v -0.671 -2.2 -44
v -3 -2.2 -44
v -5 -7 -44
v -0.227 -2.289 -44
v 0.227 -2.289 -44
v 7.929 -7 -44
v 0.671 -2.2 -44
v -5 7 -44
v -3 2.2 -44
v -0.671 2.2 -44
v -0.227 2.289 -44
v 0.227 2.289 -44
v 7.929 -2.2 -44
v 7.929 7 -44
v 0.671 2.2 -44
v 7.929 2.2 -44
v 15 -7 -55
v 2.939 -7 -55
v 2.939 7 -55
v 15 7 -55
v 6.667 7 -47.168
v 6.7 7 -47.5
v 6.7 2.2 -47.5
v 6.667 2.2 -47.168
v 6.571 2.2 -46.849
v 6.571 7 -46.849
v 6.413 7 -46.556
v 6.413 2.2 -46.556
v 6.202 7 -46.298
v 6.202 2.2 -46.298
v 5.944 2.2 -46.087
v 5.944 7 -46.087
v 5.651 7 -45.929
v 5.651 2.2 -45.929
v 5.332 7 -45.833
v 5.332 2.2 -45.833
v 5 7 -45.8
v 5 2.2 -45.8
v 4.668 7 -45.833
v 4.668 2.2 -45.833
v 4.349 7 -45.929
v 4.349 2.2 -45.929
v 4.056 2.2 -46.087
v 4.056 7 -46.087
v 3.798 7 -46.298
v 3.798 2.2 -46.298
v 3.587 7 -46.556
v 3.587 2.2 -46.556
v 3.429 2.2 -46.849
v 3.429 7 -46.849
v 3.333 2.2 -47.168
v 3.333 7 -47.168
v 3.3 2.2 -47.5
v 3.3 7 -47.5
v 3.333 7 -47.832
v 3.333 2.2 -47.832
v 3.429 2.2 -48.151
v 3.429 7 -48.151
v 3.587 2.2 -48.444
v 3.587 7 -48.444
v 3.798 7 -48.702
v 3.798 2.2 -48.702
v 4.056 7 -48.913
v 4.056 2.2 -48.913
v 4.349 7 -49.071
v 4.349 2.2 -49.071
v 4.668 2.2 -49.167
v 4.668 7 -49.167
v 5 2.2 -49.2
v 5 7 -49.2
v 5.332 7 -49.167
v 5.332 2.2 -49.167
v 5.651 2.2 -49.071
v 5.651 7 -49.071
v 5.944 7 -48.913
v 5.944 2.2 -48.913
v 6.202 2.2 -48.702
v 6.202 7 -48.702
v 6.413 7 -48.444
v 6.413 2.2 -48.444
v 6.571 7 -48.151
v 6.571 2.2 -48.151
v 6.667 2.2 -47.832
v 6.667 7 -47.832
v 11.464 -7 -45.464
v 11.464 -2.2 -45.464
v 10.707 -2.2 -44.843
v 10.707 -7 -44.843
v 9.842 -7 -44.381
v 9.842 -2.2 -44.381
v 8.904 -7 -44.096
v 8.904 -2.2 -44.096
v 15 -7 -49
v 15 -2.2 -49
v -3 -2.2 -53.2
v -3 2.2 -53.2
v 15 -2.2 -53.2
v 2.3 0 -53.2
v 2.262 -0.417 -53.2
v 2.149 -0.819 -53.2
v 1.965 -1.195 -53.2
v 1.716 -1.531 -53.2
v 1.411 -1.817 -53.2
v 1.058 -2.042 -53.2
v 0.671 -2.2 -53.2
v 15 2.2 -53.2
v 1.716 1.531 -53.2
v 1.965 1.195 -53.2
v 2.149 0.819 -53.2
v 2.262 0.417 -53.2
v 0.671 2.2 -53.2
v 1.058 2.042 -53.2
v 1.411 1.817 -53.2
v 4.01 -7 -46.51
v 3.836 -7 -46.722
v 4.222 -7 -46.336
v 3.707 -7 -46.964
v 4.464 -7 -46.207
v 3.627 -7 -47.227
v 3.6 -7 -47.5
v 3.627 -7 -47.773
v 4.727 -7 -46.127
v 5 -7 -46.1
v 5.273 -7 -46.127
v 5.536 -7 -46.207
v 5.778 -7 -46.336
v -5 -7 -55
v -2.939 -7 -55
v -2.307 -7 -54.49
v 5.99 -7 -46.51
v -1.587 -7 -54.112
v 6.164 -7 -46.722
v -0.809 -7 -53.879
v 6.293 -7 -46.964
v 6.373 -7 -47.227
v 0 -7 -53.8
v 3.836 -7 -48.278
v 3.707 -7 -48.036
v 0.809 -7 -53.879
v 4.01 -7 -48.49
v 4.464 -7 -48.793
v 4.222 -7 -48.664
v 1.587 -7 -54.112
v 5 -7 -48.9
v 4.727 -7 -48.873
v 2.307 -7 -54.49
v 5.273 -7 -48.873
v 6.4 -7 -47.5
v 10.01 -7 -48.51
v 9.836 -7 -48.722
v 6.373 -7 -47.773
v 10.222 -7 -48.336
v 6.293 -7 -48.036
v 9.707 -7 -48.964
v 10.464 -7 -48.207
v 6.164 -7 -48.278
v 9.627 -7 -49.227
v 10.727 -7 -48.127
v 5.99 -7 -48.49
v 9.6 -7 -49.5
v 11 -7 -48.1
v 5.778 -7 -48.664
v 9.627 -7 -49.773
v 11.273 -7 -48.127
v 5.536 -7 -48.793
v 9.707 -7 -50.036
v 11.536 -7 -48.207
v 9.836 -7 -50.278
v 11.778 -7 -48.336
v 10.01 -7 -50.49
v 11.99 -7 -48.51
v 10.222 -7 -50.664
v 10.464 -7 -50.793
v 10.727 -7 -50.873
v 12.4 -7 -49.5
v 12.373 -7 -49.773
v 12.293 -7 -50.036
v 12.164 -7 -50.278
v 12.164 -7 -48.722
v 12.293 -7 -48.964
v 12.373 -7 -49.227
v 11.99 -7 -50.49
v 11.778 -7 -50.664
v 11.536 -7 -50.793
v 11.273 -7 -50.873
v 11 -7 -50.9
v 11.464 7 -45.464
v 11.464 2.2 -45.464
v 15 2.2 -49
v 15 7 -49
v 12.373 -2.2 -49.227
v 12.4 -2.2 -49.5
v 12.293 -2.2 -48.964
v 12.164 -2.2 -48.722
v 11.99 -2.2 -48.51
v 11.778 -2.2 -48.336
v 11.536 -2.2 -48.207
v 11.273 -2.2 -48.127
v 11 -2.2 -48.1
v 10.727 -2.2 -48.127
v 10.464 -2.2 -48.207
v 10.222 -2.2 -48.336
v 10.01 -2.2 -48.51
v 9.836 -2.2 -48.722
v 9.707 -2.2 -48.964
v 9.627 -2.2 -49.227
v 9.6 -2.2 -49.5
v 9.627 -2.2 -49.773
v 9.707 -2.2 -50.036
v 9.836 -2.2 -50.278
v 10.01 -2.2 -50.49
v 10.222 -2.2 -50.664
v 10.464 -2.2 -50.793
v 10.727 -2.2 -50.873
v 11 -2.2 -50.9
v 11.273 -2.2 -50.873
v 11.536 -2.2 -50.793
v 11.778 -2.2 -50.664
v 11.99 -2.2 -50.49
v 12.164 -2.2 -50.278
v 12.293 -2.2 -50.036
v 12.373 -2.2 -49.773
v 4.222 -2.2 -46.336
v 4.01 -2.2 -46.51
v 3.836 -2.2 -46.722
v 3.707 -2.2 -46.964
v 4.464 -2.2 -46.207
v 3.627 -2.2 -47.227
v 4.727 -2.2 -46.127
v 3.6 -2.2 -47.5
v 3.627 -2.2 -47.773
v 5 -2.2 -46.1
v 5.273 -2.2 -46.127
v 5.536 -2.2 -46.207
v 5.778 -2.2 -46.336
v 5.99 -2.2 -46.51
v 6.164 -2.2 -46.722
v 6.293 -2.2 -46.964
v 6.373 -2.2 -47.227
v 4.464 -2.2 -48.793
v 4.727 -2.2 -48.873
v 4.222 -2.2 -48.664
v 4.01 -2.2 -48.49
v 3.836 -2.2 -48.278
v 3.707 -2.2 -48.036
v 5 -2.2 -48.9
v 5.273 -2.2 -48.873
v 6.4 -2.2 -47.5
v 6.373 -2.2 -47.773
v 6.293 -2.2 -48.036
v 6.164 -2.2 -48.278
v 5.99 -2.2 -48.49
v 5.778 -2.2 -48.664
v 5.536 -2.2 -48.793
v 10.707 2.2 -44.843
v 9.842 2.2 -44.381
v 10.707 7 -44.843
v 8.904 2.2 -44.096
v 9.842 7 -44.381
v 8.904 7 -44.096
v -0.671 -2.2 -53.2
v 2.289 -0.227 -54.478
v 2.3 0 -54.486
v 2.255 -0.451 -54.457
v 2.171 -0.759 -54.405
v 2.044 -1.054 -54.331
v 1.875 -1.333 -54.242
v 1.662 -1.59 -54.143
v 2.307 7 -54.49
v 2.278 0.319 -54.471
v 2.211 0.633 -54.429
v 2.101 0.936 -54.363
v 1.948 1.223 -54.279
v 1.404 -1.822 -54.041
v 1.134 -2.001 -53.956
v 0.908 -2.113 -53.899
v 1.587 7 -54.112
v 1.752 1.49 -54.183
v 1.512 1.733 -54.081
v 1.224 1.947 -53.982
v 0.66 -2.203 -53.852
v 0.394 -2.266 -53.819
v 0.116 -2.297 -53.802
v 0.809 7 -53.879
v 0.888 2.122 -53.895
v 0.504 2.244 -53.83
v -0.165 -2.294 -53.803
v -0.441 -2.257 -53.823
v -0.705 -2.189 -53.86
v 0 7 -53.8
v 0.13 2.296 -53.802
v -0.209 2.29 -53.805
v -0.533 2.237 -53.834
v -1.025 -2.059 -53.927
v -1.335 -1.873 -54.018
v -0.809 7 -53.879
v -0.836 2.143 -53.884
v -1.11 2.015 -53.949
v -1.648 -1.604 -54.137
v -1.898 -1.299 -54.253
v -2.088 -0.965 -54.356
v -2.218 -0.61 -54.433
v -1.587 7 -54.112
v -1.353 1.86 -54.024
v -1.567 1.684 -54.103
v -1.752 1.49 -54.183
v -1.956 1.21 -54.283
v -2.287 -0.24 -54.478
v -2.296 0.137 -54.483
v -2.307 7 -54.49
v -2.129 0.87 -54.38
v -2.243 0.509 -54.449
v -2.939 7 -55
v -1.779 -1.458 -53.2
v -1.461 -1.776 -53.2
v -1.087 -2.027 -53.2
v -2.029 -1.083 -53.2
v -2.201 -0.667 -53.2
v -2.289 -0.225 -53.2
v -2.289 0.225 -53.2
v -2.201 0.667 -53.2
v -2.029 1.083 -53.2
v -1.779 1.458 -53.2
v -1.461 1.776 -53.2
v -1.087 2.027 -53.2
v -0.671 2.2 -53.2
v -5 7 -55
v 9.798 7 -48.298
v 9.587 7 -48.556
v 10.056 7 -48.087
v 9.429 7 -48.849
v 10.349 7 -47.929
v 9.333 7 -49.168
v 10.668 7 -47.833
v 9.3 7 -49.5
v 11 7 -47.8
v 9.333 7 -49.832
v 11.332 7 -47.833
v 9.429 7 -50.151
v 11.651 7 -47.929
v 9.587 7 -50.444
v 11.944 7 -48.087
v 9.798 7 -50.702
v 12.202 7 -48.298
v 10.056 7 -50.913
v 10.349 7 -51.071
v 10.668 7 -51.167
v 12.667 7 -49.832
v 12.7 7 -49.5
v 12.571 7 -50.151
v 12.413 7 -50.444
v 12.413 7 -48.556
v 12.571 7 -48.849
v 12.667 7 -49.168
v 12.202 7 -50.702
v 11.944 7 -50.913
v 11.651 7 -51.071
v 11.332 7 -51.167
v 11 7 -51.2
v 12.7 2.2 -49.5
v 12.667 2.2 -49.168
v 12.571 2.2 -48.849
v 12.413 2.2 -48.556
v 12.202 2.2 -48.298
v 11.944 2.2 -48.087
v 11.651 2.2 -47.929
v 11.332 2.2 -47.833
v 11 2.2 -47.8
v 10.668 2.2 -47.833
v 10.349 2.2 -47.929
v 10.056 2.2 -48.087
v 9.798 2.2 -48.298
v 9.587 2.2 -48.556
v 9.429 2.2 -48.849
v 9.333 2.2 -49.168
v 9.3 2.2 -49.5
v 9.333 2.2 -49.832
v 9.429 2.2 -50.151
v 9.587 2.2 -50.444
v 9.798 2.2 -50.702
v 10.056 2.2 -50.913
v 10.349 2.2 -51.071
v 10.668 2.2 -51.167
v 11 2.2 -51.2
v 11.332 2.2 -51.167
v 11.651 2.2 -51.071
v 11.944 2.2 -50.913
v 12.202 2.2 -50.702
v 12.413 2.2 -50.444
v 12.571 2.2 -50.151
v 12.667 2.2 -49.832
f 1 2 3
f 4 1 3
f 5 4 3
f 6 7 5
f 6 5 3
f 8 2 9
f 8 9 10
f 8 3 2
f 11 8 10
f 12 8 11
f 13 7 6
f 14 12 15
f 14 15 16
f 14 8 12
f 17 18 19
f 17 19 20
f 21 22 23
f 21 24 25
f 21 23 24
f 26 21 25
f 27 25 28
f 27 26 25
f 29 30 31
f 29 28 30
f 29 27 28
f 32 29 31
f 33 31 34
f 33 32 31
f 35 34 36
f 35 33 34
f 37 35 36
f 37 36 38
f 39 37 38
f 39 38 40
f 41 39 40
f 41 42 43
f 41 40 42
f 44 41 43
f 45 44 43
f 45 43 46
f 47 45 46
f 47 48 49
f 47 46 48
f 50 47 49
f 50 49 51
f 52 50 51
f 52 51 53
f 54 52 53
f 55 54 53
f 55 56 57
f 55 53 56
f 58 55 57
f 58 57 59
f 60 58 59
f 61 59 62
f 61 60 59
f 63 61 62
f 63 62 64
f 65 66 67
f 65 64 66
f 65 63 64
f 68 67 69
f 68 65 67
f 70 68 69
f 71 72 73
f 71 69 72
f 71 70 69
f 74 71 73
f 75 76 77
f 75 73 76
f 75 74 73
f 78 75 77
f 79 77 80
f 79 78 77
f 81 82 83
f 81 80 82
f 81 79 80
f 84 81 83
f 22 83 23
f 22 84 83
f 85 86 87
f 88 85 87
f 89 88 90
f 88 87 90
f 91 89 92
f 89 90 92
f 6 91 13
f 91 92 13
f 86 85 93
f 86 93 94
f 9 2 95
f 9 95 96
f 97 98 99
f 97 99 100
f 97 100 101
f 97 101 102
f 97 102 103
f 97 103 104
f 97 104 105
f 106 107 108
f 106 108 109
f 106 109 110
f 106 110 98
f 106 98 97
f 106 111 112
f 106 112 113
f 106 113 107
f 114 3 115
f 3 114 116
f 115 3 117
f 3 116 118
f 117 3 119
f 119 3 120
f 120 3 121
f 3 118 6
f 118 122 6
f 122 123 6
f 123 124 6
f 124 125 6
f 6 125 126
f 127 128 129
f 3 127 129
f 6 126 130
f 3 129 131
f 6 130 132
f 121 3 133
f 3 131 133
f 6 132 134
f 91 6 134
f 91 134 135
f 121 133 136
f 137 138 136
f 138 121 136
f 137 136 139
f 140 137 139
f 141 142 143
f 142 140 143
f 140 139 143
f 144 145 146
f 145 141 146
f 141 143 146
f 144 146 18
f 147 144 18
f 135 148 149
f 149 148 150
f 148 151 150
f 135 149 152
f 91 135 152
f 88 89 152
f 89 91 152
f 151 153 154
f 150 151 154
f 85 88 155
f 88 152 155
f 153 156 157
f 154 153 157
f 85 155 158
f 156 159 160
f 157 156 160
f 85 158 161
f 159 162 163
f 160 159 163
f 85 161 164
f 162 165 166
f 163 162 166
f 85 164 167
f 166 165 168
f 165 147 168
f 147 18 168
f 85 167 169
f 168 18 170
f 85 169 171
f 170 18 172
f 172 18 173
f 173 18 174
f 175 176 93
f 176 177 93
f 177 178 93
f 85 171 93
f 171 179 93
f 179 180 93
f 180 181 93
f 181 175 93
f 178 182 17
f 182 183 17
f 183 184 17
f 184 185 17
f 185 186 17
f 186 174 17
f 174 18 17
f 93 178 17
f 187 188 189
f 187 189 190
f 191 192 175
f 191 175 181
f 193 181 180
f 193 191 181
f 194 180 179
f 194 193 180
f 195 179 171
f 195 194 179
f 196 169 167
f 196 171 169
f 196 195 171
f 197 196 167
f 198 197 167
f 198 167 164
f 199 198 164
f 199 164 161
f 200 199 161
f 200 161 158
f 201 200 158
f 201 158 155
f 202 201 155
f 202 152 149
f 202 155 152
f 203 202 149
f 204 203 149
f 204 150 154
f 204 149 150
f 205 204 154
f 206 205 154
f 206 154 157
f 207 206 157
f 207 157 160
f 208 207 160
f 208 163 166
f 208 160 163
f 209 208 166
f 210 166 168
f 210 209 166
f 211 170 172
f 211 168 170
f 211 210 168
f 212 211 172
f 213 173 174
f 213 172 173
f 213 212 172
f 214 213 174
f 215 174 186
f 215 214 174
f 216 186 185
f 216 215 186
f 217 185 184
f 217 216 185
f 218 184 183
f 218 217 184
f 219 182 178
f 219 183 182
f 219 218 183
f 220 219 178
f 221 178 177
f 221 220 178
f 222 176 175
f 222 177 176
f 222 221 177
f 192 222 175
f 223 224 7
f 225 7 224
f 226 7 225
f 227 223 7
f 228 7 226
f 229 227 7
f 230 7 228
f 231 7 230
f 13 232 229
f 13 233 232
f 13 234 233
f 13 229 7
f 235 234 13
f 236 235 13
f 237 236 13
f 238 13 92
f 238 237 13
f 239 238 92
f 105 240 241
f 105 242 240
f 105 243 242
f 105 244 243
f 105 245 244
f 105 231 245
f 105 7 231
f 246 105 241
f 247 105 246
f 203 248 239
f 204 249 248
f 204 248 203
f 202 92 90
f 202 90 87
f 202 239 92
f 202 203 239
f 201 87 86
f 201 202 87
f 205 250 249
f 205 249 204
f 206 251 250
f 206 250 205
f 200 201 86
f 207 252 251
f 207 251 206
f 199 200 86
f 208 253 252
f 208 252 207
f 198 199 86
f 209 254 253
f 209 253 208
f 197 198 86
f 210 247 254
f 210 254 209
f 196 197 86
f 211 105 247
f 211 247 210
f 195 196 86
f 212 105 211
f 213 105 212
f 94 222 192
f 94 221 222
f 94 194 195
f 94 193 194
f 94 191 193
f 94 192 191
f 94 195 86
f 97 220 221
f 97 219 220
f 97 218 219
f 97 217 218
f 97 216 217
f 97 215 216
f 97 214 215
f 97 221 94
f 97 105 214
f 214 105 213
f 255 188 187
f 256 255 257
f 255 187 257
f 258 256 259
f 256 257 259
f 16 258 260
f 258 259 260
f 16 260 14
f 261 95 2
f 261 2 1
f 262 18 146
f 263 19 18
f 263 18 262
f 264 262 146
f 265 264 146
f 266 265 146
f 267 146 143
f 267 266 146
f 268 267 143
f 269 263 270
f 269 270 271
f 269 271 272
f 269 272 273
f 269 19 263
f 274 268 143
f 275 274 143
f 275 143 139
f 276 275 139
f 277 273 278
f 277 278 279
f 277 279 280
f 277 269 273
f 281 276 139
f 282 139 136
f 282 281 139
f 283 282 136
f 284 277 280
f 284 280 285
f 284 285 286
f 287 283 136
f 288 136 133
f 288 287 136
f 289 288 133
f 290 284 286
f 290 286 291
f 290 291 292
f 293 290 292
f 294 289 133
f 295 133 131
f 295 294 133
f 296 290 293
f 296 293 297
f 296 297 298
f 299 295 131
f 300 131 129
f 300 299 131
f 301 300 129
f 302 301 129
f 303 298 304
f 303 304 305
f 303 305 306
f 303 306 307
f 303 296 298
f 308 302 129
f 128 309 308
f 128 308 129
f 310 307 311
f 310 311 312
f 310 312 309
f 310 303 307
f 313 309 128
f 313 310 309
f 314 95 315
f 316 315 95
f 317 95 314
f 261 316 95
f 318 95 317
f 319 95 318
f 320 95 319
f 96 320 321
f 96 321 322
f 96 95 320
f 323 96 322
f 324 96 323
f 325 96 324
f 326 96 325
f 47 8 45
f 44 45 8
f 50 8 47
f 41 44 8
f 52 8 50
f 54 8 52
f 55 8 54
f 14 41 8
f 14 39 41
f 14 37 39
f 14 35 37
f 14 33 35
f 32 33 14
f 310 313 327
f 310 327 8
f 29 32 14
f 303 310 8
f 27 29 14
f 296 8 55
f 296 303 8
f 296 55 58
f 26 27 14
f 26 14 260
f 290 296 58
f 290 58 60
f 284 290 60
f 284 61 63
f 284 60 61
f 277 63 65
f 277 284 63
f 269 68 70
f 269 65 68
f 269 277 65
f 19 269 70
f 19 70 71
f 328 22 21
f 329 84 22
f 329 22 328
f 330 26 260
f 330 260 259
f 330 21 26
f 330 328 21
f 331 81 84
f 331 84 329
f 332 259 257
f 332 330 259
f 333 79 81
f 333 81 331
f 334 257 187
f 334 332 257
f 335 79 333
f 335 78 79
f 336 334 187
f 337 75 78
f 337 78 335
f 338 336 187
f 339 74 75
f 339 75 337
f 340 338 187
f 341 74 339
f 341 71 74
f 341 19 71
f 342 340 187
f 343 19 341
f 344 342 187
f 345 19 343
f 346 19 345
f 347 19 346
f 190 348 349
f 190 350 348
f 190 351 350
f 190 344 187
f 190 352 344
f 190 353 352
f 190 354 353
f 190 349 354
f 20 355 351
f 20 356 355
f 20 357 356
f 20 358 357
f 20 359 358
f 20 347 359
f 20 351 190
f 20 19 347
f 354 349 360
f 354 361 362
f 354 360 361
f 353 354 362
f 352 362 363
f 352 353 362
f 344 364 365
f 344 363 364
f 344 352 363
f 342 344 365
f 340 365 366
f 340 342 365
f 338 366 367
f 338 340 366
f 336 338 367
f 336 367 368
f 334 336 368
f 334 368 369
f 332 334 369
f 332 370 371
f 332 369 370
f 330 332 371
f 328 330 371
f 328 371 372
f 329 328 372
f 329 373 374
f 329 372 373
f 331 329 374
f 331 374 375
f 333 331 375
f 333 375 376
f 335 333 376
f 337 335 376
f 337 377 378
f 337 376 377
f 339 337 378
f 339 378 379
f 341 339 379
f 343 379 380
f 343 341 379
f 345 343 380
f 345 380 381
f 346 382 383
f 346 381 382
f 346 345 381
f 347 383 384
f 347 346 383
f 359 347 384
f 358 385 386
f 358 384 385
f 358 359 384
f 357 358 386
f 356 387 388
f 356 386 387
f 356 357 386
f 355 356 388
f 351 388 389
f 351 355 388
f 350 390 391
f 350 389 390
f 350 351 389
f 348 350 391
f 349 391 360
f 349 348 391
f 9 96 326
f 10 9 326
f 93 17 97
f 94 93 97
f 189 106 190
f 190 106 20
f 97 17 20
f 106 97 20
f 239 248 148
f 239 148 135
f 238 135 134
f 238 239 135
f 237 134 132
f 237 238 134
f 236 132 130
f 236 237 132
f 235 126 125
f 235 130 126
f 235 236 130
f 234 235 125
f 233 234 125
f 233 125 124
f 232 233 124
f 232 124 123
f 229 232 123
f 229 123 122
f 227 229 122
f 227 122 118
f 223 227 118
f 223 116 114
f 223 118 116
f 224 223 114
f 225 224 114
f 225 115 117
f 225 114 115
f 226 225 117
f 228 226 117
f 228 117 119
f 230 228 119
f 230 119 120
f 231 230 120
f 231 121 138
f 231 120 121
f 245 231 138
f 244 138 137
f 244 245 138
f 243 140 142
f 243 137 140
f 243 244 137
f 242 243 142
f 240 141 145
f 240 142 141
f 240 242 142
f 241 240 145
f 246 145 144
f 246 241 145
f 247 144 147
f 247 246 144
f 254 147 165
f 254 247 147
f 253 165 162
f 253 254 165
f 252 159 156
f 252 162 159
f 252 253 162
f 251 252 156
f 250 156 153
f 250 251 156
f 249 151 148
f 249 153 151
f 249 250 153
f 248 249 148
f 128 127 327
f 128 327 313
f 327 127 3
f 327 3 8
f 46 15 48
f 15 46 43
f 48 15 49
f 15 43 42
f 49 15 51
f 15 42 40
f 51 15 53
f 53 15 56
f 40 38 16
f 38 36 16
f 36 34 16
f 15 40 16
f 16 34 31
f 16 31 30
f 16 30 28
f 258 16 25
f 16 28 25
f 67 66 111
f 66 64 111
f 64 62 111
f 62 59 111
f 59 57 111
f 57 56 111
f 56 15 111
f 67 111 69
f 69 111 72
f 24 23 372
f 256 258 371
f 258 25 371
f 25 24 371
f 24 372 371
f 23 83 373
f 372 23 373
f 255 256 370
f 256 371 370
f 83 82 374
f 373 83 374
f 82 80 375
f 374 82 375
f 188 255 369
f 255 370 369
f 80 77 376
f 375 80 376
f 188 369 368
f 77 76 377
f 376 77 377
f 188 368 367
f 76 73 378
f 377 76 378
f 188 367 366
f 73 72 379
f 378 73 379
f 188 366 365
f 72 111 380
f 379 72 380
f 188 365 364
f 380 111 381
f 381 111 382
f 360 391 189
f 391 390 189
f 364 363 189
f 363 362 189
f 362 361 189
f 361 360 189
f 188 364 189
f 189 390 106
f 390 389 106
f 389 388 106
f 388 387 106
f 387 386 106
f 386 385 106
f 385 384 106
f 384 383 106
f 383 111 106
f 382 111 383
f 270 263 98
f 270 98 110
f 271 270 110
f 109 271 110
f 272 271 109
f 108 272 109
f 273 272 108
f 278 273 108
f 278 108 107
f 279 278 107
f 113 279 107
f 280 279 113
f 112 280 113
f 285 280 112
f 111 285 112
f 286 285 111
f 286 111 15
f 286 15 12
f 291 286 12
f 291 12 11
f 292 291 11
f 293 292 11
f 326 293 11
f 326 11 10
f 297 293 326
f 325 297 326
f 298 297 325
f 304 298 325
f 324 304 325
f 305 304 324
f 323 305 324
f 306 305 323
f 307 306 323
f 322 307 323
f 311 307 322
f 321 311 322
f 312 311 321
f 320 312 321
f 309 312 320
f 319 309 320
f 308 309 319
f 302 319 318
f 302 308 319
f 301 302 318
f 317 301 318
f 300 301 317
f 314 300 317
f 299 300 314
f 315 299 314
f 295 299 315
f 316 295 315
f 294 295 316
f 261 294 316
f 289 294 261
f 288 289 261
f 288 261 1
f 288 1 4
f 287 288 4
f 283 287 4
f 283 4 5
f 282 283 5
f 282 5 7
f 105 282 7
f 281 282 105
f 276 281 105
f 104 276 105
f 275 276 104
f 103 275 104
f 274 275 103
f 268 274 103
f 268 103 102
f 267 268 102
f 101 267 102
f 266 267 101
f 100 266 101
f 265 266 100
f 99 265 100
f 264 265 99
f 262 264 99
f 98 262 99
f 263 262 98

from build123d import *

# Parameters (mm, degrees)
CYLINDER060_R          = 2.3
CYLINDER060_DEPTH      = 62
CYLINDER062_R          = 4.2
CYLINDER062_DEPTH      = 24
CYLINDER062_ROLL_ANGLE = 90
BOX001024_W            = 23
BOX001024_H            = 4.4
BOX001024_DEPTH        = 13
CYLINDER056_R          = 1.7
CYLINDER056_DEPTH      = 20
CYLINDER056_ROLL_ANGLE = 90
CYLINDER057_R          = 1.7
CYLINDER057_DEPTH      = 20
CYLINDER057_ROLL_ANGLE = 90
CYLINDER059_R          = 1.4
CYLINDER059_DEPTH      = 20
CYLINDER059_ROLL_ANGLE = 90
CYLINDER058_R          = 1.4
CYLINDER058_DEPTH      = 20
CYLINDER058_ROLL_ANGLE = 90
BOX001025_W            = 10
BOX001025_H            = 27
BOX001025_DEPTH        = 10
BOX001022_W            = 23
BOX001022_H            = 14
BOX001022_DEPTH        = 11
CHAMFER003_SIZE        = 8
FILLET007_R            = 5


with BuildPart() as cylinder060:
    # Cylinder060 → Cylinder060 (new body)
    with BuildSketch(Plane.XY.offset(-56)):
        Circle(CYLINDER060_R)
    extrude(amount=CYLINDER060_DEPTH)


with BuildPart() as cylinder062:
    # Cylinder062 → Cylinder062 (new body)
    with BuildSketch(Plane.XY):
        Circle(CYLINDER062_R)
    extrude(amount=CYLINDER062_DEPTH)


with BuildPart() as cylinder062_1:
    # Cylinder062 roll: moved
    add(cylinder062.part.rotate(Axis((0, 0, 0), (1, 0, 0)), CYLINDER062_ROLL_ANGLE))


with BuildPart() as cylinder062_2:
    # Cylinder062 placement: moved
    add(cylinder062_1.part.moved(Location((0, 11, -52))))


with BuildPart() as cube022:
    # Box001024 → Box001024 (new body)
    with BuildSketch(Plane(origin=(-3, -2.2, -47.2), x_dir=(1, 0, 0), z_dir=(0, 0, 1))):
        with Locations((11.5, 2.2)):
            Rectangle(BOX001024_W, BOX001024_H)
    extrude(amount=BOX001024_DEPTH)


with BuildPart() as cylinder056:
    # Cylinder056 → Cylinder056 (new body)
    with BuildSketch(Plane.XY):
        Circle(CYLINDER056_R)
    extrude(amount=CYLINDER056_DEPTH)


with BuildPart() as cylinder056_1:
    # Cylinder056 roll: moved
    add(cylinder056.part.rotate(Axis((0, 0, 0), (1, 0, 0)), CYLINDER056_ROLL_ANGLE))


with BuildPart() as cylinder056_2:
    # Cylinder056 placement: moved
    add(cylinder056_1.part.moved(Location((11, 19, -43.5))))


with BuildPart() as cylinder057:
    # Cylinder057 → Cylinder057 (new body)
    with BuildSketch(Plane.XY):
        Circle(CYLINDER057_R)
    extrude(amount=CYLINDER057_DEPTH)


with BuildPart() as cylinder057_1:
    # Cylinder057 roll: moved
    add(cylinder057.part.rotate(Axis((0, 0, 0), (1, 0, 0)), CYLINDER057_ROLL_ANGLE))


with BuildPart() as cylinder057_2:
    # Cylinder057 placement: moved
    add(cylinder057_1.part.moved(Location((5, 19, -41.5))))


with BuildPart() as cylinder059:
    # Cylinder059 → Cylinder059 (new body)
    with BuildSketch(Plane.XY):
        Circle(CYLINDER059_R)
    extrude(amount=CYLINDER059_DEPTH)


with BuildPart() as cylinder059_1:
    # Cylinder059 roll: moved
    add(cylinder059.part.rotate(Axis((0, 0, 0), (1, 0, 0)), CYLINDER059_ROLL_ANGLE))


with BuildPart() as cylinder059_2:
    # Cylinder059 placement: moved
    add(cylinder059_1.part.moved(Location((5, -1, -41.5))))


with BuildPart() as fusion074:
    # Cylinder058 → Cylinder058 (new body)
    with BuildSketch(Plane.XY):
        Circle(CYLINDER058_R)
    extrude(amount=CYLINDER058_DEPTH)


with BuildPart() as fusion074_1:
    # Cylinder058 roll: moved
    add(fusion074.part.rotate(Axis((0, 0, 0), (1, 0, 0)), CYLINDER058_ROLL_ANGLE))


with BuildPart() as fusion074_2:
    # Cylinder058 placement: moved
    add(fusion074_1.part.moved(Location((11, -1, -43.5))))

    # Fusion074: union Cylinder056, Cylinder057, Cylinder059
    add(cylinder056_2.part)
    add(cylinder057_2.part)
    add(cylinder059_2.part)


with BuildPart() as cube023:
    # Box001025 → Box001025 (new body)
    with BuildSketch(Plane(origin=(15, -13, -44), x_dir=(1, 0, 0), z_dir=(0, 0, 1))):
        with Locations((5, 13.5)):
            Rectangle(BOX001025_W, BOX001025_H)
    extrude(amount=BOX001025_DEPTH)


with BuildPart() as cut_lever_block:
    # Box001022 → Box001022 (new body)
    with BuildSketch(Plane(origin=(-5, -7, -42), x_dir=(1, 0, 0), z_dir=(0, 0, 1))):
        with Locations((11.5, 7)):
            Rectangle(BOX001022_W, BOX001022_H)
    extrude(amount=BOX001022_DEPTH)

    # Chamfer003
    chamfer003_edges = [cut_lever_block.edges().sort_by_distance(p)[0] for p in [
        (18, 0, -31),
    ]]
    chamfer(chamfer003_edges, length=CHAMFER003_SIZE)

    # Fillet007
    fillet007_edges = [cut_lever_block.edges().sort_by_distance(p)[0] for p in [
        (10, 0, -31),
    ]]
    fillet(fillet007_edges, radius=FILLET007_R)

    # Cut022: cut Cube023
    add(cube023.part, mode=Mode.SUBTRACT)


with BuildPart() as cut_lever_block_1:
    # Cut022 placement: moved
    add(cut_lever_block.part.moved(Location((0, 0, -7))))

    # Cut027: cut Fusion074
    add(fusion074_2.part, mode=Mode.SUBTRACT)

    # Cut028: cut Cube022
    add(cube022.part, mode=Mode.SUBTRACT)

    # Cut029: cut Cylinder062
    add(cylinder062_2.part, mode=Mode.SUBTRACT)

    # Cut030: cut Cylinder060
    add(cylinder060.part, mode=Mode.SUBTRACT)


with BuildPart() as cut_lever_block_2:
    # Cut030 placement: moved
    add(cut_lever_block_1.part.moved(Location((0, 0, -6))))


solid = cut_lever_block_2.part
